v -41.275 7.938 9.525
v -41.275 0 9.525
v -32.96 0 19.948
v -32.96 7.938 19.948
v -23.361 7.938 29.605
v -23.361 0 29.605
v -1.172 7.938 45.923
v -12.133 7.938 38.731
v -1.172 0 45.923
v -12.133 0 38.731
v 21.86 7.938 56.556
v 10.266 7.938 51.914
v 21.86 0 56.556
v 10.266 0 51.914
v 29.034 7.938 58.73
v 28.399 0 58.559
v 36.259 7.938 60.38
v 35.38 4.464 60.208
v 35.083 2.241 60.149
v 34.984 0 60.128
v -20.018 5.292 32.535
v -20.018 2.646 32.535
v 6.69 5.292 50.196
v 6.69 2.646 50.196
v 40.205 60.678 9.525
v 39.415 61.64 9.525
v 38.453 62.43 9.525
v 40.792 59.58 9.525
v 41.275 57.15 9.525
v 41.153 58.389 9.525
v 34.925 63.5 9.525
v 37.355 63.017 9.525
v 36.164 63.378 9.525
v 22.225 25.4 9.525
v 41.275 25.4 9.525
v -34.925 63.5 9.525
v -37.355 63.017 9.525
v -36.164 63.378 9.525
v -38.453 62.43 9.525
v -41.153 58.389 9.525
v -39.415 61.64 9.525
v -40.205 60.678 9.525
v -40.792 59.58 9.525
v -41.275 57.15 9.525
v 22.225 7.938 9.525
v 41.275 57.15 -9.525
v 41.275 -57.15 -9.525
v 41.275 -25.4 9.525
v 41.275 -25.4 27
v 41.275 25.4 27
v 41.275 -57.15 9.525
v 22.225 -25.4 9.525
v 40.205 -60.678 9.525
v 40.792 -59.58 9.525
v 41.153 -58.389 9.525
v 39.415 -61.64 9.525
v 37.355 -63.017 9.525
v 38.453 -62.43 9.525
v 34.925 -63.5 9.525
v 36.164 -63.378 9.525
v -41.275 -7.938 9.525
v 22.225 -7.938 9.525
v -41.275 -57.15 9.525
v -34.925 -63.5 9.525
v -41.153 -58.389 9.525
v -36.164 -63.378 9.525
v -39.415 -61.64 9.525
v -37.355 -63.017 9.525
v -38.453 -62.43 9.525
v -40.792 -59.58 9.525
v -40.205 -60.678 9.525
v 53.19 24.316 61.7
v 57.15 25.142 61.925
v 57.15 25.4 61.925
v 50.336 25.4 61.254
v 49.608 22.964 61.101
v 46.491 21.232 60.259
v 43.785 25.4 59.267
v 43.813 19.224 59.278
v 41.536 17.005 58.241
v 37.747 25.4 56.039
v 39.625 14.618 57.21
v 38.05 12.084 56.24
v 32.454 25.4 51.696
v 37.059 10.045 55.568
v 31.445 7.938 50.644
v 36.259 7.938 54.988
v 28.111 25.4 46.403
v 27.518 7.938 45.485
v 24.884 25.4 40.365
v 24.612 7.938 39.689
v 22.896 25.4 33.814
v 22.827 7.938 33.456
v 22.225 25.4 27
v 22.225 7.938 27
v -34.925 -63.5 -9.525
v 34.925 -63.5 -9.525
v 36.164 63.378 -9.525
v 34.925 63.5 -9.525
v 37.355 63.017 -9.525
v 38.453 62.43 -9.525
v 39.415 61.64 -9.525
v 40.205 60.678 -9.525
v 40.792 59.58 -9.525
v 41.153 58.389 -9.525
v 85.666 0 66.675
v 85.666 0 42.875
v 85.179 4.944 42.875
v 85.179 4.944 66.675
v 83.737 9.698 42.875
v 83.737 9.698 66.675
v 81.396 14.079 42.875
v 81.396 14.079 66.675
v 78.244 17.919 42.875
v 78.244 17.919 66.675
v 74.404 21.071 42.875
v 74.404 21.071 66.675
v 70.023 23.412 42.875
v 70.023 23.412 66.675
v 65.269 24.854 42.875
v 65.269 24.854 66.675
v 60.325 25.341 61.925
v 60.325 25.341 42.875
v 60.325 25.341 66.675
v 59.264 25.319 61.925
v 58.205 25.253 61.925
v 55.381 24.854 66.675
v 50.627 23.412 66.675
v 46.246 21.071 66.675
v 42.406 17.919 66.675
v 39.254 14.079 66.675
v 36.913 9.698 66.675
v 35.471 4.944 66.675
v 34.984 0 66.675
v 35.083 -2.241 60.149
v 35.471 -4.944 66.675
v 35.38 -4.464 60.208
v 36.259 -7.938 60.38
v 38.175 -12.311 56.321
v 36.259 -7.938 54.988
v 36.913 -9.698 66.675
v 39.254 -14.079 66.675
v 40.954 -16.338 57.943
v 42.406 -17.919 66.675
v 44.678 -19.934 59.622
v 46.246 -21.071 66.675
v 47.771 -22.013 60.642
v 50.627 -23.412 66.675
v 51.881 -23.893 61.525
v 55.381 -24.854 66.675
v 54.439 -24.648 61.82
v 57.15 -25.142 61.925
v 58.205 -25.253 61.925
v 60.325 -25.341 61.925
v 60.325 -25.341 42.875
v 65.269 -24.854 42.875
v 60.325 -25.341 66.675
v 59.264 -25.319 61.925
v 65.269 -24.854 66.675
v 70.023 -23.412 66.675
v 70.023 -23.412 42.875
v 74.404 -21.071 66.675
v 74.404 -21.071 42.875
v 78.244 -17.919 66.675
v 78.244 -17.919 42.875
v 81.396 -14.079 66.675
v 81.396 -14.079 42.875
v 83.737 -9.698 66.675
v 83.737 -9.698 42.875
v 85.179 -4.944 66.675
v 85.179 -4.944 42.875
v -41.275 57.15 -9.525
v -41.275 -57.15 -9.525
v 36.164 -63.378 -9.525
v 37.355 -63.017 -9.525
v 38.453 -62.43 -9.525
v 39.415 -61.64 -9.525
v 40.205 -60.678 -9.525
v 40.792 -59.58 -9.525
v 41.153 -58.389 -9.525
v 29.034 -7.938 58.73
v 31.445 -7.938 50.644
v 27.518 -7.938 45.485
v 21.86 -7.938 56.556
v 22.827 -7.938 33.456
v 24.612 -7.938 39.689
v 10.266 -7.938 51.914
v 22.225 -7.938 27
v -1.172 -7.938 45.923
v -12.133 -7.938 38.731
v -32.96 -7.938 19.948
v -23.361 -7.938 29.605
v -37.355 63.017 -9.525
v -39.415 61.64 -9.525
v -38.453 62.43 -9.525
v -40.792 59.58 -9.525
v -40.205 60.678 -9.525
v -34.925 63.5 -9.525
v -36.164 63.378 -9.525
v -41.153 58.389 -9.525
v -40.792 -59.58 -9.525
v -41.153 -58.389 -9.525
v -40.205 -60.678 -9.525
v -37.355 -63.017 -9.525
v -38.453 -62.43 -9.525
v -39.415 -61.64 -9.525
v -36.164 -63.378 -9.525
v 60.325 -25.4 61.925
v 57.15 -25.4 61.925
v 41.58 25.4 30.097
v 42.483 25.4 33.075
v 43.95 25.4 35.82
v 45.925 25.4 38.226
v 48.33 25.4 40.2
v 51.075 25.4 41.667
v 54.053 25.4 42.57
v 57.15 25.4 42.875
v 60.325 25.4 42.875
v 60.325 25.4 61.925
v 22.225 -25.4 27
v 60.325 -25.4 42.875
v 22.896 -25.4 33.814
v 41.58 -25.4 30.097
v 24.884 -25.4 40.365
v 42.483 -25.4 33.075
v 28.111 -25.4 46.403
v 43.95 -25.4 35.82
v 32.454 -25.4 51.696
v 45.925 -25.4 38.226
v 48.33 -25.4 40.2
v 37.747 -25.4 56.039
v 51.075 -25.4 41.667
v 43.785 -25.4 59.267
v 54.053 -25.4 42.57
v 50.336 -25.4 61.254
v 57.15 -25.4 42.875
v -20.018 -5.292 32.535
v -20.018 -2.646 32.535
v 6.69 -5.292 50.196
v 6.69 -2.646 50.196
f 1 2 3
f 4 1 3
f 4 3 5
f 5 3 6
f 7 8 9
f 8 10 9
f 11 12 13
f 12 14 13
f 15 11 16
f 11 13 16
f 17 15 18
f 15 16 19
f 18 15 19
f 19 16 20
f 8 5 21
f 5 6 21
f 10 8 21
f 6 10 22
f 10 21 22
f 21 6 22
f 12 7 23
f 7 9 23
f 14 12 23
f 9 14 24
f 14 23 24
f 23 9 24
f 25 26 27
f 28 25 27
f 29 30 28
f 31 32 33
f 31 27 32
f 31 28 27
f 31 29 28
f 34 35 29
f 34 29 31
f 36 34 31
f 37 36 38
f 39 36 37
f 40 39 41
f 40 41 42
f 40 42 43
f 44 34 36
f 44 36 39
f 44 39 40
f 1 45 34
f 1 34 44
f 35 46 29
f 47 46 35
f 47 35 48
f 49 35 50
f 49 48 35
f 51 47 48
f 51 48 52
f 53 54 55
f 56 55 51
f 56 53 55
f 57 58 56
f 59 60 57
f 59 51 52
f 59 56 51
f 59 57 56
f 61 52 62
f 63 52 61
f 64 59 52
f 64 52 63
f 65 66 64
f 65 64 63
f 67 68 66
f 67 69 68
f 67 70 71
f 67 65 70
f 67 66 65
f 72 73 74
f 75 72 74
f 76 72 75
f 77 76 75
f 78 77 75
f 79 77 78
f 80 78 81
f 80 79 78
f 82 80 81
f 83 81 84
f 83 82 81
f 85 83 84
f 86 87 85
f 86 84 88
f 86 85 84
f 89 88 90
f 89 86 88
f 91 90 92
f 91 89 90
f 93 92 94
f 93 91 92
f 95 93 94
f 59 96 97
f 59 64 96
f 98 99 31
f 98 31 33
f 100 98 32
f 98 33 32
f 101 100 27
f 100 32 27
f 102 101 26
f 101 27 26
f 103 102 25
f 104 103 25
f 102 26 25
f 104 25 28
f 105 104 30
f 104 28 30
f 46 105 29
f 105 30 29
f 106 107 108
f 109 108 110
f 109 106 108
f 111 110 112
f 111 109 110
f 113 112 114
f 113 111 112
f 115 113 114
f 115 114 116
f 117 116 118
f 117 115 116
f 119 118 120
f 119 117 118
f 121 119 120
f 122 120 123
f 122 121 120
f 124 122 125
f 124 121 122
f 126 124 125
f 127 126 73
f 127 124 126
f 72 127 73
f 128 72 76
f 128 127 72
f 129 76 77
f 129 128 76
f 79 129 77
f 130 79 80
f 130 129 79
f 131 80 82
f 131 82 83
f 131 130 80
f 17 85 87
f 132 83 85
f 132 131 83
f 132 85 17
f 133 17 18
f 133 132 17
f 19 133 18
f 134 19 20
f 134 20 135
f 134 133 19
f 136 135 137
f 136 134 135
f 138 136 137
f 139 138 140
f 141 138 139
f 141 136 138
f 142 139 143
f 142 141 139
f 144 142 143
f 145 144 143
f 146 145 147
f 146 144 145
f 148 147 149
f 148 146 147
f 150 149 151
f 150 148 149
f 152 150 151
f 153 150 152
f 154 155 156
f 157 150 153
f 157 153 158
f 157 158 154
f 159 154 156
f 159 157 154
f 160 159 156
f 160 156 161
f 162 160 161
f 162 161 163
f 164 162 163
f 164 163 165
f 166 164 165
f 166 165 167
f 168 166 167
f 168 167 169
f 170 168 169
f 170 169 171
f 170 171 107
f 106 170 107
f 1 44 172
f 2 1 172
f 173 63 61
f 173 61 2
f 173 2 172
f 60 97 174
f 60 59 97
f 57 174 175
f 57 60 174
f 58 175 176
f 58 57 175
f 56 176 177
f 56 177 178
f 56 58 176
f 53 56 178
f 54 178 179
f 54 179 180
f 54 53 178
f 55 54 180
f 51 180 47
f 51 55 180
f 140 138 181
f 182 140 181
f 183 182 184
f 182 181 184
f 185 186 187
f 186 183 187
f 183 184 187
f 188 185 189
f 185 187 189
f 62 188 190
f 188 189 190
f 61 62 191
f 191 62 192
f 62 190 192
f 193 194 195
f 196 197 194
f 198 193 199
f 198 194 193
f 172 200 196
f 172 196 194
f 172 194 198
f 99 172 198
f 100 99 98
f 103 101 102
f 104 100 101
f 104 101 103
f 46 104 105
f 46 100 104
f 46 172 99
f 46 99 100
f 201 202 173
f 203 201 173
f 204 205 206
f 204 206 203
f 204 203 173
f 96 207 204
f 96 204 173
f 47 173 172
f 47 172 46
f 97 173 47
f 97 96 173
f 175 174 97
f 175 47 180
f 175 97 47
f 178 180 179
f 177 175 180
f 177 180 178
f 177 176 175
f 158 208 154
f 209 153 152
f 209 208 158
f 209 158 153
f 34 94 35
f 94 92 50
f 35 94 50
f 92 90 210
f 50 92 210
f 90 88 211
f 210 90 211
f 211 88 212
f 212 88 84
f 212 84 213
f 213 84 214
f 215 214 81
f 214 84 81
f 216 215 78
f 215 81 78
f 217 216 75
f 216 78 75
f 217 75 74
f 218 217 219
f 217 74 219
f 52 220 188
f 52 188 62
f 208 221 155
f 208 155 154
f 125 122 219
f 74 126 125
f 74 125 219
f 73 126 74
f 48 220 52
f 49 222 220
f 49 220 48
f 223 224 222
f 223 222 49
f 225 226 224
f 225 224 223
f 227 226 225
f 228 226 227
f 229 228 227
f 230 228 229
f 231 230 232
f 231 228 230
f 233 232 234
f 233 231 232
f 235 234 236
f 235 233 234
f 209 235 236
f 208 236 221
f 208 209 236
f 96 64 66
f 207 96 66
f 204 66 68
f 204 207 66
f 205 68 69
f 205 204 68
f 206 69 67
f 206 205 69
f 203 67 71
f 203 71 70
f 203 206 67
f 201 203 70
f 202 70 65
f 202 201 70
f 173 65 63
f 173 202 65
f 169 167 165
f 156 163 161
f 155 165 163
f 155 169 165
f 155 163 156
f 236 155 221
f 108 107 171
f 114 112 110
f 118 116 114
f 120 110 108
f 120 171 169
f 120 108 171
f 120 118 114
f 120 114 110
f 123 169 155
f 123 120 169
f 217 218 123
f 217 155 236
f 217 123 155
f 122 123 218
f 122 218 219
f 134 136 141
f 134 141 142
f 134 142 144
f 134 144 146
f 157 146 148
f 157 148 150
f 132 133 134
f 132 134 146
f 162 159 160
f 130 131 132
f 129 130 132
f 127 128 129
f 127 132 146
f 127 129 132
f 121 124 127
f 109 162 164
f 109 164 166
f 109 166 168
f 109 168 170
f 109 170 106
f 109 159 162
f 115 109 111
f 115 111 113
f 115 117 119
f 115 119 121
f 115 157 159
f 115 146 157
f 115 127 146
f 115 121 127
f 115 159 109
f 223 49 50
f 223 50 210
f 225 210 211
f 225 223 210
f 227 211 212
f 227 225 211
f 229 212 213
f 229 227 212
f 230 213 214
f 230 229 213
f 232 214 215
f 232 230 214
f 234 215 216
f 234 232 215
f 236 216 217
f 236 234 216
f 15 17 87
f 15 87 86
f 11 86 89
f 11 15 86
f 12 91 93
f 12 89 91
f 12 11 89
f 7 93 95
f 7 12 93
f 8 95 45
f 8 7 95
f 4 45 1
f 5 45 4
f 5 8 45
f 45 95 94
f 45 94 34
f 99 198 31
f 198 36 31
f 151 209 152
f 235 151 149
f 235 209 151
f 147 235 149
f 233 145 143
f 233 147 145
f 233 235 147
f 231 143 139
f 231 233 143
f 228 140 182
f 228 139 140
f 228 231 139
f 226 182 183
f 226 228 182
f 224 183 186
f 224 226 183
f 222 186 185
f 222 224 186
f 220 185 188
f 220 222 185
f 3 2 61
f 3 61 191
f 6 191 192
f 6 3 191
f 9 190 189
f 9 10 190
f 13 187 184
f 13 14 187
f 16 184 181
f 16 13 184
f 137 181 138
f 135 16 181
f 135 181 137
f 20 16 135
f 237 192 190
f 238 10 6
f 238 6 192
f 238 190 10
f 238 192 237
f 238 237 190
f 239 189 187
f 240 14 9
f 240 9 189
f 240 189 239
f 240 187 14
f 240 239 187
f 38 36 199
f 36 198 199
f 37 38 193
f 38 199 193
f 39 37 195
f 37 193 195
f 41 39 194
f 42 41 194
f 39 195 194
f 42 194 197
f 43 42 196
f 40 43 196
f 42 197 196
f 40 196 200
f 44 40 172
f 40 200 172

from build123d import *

# Parameters (mm, degrees)
F1_DEPTH = 63.5
F2_DEPTH = 25.4
F3_DEPTH = 7.9375
F5_R     = 6.35


with BuildPart() as f1:
    # F0 (on Front) → F1 (new body, symmetric)
    with BuildSketch(Plane.XZ):
        Polygon((-41.275, -9.525), (41.275, -9.525), (41.275, 9.525), (22.225, 9.525), (-41.275, 9.525), align=None)
    extrude(amount=F1_DEPTH, both=True)

    # F0 (on Front) → F2 (join, symmetric)
    with BuildSketch(Plane.XZ):
        with BuildLine():
            Line((22.225, 9.525), (41.275, 9.525))
            Line((41.275, 9.525), (41.275, 27.0002))
            ThreePointArc((41.275, 27.0002), (45.92468, 38.22552), (57.15, 42.8752))
            Line((57.15, 42.8752), (60.325, 42.8752))
            Line((60.325, 42.8752), (60.325, 61.9252))
            Line((60.325, 61.9252), (57.15, 61.9252))
            ThreePointArc((57.15, 61.9252), (32.454296, 51.695904), (22.225, 27.0002))
            Line((22.225, 27.0002), (22.225, 9.525))
        make_face()
    extrude(amount=F2_DEPTH, both=True)

    # F0 (on Front) → F3 (join, symmetric)
    with BuildSketch(Plane.XZ):
        with BuildLine():
            add(Edge.make_bspline(
                [(-41.275, 9.525), (-19.508036, 40.293224), (20.560727, 63.729674), (57.15, 61.9252)],
                knots=[0, 0, 0, 0, 111.504536, 111.504536, 111.504536, 111.504536], degree=3))
            Line((-41.275, 9.525), (22.225, 9.525))
            Line((22.225, 9.525), (22.225, 27.0002))
            ThreePointArc((22.225, 27.0002), (32.454296, 51.695904), (57.15, 61.9252))
        make_face()
    extrude(amount=F3_DEPTH, both=True)

    # F0 (on Front) → F4 (revolve)
    with BuildSketch(Plane.XZ):
        Polygon((60.325, 66.675), (60.325, 61.9252), (60.325, 42.8752), (85.666397, 42.8752), (85.666397, 66.675), align=None)
    revolve(axis=Axis((60.325, 0, 52.3875), (0, 0, 1)))

    # F5
    f5_edges = [f1.edges().sort_by_distance(p)[0] for p in [
        (-41.275, -63.5, 0),
        (41.275, -63.5, 0),
        (41.275, 63.5, 0),
        (-41.275, 63.5, 0),
    ]]
    fillet(f5_edges, radius=F5_R)


solid = f1.part
